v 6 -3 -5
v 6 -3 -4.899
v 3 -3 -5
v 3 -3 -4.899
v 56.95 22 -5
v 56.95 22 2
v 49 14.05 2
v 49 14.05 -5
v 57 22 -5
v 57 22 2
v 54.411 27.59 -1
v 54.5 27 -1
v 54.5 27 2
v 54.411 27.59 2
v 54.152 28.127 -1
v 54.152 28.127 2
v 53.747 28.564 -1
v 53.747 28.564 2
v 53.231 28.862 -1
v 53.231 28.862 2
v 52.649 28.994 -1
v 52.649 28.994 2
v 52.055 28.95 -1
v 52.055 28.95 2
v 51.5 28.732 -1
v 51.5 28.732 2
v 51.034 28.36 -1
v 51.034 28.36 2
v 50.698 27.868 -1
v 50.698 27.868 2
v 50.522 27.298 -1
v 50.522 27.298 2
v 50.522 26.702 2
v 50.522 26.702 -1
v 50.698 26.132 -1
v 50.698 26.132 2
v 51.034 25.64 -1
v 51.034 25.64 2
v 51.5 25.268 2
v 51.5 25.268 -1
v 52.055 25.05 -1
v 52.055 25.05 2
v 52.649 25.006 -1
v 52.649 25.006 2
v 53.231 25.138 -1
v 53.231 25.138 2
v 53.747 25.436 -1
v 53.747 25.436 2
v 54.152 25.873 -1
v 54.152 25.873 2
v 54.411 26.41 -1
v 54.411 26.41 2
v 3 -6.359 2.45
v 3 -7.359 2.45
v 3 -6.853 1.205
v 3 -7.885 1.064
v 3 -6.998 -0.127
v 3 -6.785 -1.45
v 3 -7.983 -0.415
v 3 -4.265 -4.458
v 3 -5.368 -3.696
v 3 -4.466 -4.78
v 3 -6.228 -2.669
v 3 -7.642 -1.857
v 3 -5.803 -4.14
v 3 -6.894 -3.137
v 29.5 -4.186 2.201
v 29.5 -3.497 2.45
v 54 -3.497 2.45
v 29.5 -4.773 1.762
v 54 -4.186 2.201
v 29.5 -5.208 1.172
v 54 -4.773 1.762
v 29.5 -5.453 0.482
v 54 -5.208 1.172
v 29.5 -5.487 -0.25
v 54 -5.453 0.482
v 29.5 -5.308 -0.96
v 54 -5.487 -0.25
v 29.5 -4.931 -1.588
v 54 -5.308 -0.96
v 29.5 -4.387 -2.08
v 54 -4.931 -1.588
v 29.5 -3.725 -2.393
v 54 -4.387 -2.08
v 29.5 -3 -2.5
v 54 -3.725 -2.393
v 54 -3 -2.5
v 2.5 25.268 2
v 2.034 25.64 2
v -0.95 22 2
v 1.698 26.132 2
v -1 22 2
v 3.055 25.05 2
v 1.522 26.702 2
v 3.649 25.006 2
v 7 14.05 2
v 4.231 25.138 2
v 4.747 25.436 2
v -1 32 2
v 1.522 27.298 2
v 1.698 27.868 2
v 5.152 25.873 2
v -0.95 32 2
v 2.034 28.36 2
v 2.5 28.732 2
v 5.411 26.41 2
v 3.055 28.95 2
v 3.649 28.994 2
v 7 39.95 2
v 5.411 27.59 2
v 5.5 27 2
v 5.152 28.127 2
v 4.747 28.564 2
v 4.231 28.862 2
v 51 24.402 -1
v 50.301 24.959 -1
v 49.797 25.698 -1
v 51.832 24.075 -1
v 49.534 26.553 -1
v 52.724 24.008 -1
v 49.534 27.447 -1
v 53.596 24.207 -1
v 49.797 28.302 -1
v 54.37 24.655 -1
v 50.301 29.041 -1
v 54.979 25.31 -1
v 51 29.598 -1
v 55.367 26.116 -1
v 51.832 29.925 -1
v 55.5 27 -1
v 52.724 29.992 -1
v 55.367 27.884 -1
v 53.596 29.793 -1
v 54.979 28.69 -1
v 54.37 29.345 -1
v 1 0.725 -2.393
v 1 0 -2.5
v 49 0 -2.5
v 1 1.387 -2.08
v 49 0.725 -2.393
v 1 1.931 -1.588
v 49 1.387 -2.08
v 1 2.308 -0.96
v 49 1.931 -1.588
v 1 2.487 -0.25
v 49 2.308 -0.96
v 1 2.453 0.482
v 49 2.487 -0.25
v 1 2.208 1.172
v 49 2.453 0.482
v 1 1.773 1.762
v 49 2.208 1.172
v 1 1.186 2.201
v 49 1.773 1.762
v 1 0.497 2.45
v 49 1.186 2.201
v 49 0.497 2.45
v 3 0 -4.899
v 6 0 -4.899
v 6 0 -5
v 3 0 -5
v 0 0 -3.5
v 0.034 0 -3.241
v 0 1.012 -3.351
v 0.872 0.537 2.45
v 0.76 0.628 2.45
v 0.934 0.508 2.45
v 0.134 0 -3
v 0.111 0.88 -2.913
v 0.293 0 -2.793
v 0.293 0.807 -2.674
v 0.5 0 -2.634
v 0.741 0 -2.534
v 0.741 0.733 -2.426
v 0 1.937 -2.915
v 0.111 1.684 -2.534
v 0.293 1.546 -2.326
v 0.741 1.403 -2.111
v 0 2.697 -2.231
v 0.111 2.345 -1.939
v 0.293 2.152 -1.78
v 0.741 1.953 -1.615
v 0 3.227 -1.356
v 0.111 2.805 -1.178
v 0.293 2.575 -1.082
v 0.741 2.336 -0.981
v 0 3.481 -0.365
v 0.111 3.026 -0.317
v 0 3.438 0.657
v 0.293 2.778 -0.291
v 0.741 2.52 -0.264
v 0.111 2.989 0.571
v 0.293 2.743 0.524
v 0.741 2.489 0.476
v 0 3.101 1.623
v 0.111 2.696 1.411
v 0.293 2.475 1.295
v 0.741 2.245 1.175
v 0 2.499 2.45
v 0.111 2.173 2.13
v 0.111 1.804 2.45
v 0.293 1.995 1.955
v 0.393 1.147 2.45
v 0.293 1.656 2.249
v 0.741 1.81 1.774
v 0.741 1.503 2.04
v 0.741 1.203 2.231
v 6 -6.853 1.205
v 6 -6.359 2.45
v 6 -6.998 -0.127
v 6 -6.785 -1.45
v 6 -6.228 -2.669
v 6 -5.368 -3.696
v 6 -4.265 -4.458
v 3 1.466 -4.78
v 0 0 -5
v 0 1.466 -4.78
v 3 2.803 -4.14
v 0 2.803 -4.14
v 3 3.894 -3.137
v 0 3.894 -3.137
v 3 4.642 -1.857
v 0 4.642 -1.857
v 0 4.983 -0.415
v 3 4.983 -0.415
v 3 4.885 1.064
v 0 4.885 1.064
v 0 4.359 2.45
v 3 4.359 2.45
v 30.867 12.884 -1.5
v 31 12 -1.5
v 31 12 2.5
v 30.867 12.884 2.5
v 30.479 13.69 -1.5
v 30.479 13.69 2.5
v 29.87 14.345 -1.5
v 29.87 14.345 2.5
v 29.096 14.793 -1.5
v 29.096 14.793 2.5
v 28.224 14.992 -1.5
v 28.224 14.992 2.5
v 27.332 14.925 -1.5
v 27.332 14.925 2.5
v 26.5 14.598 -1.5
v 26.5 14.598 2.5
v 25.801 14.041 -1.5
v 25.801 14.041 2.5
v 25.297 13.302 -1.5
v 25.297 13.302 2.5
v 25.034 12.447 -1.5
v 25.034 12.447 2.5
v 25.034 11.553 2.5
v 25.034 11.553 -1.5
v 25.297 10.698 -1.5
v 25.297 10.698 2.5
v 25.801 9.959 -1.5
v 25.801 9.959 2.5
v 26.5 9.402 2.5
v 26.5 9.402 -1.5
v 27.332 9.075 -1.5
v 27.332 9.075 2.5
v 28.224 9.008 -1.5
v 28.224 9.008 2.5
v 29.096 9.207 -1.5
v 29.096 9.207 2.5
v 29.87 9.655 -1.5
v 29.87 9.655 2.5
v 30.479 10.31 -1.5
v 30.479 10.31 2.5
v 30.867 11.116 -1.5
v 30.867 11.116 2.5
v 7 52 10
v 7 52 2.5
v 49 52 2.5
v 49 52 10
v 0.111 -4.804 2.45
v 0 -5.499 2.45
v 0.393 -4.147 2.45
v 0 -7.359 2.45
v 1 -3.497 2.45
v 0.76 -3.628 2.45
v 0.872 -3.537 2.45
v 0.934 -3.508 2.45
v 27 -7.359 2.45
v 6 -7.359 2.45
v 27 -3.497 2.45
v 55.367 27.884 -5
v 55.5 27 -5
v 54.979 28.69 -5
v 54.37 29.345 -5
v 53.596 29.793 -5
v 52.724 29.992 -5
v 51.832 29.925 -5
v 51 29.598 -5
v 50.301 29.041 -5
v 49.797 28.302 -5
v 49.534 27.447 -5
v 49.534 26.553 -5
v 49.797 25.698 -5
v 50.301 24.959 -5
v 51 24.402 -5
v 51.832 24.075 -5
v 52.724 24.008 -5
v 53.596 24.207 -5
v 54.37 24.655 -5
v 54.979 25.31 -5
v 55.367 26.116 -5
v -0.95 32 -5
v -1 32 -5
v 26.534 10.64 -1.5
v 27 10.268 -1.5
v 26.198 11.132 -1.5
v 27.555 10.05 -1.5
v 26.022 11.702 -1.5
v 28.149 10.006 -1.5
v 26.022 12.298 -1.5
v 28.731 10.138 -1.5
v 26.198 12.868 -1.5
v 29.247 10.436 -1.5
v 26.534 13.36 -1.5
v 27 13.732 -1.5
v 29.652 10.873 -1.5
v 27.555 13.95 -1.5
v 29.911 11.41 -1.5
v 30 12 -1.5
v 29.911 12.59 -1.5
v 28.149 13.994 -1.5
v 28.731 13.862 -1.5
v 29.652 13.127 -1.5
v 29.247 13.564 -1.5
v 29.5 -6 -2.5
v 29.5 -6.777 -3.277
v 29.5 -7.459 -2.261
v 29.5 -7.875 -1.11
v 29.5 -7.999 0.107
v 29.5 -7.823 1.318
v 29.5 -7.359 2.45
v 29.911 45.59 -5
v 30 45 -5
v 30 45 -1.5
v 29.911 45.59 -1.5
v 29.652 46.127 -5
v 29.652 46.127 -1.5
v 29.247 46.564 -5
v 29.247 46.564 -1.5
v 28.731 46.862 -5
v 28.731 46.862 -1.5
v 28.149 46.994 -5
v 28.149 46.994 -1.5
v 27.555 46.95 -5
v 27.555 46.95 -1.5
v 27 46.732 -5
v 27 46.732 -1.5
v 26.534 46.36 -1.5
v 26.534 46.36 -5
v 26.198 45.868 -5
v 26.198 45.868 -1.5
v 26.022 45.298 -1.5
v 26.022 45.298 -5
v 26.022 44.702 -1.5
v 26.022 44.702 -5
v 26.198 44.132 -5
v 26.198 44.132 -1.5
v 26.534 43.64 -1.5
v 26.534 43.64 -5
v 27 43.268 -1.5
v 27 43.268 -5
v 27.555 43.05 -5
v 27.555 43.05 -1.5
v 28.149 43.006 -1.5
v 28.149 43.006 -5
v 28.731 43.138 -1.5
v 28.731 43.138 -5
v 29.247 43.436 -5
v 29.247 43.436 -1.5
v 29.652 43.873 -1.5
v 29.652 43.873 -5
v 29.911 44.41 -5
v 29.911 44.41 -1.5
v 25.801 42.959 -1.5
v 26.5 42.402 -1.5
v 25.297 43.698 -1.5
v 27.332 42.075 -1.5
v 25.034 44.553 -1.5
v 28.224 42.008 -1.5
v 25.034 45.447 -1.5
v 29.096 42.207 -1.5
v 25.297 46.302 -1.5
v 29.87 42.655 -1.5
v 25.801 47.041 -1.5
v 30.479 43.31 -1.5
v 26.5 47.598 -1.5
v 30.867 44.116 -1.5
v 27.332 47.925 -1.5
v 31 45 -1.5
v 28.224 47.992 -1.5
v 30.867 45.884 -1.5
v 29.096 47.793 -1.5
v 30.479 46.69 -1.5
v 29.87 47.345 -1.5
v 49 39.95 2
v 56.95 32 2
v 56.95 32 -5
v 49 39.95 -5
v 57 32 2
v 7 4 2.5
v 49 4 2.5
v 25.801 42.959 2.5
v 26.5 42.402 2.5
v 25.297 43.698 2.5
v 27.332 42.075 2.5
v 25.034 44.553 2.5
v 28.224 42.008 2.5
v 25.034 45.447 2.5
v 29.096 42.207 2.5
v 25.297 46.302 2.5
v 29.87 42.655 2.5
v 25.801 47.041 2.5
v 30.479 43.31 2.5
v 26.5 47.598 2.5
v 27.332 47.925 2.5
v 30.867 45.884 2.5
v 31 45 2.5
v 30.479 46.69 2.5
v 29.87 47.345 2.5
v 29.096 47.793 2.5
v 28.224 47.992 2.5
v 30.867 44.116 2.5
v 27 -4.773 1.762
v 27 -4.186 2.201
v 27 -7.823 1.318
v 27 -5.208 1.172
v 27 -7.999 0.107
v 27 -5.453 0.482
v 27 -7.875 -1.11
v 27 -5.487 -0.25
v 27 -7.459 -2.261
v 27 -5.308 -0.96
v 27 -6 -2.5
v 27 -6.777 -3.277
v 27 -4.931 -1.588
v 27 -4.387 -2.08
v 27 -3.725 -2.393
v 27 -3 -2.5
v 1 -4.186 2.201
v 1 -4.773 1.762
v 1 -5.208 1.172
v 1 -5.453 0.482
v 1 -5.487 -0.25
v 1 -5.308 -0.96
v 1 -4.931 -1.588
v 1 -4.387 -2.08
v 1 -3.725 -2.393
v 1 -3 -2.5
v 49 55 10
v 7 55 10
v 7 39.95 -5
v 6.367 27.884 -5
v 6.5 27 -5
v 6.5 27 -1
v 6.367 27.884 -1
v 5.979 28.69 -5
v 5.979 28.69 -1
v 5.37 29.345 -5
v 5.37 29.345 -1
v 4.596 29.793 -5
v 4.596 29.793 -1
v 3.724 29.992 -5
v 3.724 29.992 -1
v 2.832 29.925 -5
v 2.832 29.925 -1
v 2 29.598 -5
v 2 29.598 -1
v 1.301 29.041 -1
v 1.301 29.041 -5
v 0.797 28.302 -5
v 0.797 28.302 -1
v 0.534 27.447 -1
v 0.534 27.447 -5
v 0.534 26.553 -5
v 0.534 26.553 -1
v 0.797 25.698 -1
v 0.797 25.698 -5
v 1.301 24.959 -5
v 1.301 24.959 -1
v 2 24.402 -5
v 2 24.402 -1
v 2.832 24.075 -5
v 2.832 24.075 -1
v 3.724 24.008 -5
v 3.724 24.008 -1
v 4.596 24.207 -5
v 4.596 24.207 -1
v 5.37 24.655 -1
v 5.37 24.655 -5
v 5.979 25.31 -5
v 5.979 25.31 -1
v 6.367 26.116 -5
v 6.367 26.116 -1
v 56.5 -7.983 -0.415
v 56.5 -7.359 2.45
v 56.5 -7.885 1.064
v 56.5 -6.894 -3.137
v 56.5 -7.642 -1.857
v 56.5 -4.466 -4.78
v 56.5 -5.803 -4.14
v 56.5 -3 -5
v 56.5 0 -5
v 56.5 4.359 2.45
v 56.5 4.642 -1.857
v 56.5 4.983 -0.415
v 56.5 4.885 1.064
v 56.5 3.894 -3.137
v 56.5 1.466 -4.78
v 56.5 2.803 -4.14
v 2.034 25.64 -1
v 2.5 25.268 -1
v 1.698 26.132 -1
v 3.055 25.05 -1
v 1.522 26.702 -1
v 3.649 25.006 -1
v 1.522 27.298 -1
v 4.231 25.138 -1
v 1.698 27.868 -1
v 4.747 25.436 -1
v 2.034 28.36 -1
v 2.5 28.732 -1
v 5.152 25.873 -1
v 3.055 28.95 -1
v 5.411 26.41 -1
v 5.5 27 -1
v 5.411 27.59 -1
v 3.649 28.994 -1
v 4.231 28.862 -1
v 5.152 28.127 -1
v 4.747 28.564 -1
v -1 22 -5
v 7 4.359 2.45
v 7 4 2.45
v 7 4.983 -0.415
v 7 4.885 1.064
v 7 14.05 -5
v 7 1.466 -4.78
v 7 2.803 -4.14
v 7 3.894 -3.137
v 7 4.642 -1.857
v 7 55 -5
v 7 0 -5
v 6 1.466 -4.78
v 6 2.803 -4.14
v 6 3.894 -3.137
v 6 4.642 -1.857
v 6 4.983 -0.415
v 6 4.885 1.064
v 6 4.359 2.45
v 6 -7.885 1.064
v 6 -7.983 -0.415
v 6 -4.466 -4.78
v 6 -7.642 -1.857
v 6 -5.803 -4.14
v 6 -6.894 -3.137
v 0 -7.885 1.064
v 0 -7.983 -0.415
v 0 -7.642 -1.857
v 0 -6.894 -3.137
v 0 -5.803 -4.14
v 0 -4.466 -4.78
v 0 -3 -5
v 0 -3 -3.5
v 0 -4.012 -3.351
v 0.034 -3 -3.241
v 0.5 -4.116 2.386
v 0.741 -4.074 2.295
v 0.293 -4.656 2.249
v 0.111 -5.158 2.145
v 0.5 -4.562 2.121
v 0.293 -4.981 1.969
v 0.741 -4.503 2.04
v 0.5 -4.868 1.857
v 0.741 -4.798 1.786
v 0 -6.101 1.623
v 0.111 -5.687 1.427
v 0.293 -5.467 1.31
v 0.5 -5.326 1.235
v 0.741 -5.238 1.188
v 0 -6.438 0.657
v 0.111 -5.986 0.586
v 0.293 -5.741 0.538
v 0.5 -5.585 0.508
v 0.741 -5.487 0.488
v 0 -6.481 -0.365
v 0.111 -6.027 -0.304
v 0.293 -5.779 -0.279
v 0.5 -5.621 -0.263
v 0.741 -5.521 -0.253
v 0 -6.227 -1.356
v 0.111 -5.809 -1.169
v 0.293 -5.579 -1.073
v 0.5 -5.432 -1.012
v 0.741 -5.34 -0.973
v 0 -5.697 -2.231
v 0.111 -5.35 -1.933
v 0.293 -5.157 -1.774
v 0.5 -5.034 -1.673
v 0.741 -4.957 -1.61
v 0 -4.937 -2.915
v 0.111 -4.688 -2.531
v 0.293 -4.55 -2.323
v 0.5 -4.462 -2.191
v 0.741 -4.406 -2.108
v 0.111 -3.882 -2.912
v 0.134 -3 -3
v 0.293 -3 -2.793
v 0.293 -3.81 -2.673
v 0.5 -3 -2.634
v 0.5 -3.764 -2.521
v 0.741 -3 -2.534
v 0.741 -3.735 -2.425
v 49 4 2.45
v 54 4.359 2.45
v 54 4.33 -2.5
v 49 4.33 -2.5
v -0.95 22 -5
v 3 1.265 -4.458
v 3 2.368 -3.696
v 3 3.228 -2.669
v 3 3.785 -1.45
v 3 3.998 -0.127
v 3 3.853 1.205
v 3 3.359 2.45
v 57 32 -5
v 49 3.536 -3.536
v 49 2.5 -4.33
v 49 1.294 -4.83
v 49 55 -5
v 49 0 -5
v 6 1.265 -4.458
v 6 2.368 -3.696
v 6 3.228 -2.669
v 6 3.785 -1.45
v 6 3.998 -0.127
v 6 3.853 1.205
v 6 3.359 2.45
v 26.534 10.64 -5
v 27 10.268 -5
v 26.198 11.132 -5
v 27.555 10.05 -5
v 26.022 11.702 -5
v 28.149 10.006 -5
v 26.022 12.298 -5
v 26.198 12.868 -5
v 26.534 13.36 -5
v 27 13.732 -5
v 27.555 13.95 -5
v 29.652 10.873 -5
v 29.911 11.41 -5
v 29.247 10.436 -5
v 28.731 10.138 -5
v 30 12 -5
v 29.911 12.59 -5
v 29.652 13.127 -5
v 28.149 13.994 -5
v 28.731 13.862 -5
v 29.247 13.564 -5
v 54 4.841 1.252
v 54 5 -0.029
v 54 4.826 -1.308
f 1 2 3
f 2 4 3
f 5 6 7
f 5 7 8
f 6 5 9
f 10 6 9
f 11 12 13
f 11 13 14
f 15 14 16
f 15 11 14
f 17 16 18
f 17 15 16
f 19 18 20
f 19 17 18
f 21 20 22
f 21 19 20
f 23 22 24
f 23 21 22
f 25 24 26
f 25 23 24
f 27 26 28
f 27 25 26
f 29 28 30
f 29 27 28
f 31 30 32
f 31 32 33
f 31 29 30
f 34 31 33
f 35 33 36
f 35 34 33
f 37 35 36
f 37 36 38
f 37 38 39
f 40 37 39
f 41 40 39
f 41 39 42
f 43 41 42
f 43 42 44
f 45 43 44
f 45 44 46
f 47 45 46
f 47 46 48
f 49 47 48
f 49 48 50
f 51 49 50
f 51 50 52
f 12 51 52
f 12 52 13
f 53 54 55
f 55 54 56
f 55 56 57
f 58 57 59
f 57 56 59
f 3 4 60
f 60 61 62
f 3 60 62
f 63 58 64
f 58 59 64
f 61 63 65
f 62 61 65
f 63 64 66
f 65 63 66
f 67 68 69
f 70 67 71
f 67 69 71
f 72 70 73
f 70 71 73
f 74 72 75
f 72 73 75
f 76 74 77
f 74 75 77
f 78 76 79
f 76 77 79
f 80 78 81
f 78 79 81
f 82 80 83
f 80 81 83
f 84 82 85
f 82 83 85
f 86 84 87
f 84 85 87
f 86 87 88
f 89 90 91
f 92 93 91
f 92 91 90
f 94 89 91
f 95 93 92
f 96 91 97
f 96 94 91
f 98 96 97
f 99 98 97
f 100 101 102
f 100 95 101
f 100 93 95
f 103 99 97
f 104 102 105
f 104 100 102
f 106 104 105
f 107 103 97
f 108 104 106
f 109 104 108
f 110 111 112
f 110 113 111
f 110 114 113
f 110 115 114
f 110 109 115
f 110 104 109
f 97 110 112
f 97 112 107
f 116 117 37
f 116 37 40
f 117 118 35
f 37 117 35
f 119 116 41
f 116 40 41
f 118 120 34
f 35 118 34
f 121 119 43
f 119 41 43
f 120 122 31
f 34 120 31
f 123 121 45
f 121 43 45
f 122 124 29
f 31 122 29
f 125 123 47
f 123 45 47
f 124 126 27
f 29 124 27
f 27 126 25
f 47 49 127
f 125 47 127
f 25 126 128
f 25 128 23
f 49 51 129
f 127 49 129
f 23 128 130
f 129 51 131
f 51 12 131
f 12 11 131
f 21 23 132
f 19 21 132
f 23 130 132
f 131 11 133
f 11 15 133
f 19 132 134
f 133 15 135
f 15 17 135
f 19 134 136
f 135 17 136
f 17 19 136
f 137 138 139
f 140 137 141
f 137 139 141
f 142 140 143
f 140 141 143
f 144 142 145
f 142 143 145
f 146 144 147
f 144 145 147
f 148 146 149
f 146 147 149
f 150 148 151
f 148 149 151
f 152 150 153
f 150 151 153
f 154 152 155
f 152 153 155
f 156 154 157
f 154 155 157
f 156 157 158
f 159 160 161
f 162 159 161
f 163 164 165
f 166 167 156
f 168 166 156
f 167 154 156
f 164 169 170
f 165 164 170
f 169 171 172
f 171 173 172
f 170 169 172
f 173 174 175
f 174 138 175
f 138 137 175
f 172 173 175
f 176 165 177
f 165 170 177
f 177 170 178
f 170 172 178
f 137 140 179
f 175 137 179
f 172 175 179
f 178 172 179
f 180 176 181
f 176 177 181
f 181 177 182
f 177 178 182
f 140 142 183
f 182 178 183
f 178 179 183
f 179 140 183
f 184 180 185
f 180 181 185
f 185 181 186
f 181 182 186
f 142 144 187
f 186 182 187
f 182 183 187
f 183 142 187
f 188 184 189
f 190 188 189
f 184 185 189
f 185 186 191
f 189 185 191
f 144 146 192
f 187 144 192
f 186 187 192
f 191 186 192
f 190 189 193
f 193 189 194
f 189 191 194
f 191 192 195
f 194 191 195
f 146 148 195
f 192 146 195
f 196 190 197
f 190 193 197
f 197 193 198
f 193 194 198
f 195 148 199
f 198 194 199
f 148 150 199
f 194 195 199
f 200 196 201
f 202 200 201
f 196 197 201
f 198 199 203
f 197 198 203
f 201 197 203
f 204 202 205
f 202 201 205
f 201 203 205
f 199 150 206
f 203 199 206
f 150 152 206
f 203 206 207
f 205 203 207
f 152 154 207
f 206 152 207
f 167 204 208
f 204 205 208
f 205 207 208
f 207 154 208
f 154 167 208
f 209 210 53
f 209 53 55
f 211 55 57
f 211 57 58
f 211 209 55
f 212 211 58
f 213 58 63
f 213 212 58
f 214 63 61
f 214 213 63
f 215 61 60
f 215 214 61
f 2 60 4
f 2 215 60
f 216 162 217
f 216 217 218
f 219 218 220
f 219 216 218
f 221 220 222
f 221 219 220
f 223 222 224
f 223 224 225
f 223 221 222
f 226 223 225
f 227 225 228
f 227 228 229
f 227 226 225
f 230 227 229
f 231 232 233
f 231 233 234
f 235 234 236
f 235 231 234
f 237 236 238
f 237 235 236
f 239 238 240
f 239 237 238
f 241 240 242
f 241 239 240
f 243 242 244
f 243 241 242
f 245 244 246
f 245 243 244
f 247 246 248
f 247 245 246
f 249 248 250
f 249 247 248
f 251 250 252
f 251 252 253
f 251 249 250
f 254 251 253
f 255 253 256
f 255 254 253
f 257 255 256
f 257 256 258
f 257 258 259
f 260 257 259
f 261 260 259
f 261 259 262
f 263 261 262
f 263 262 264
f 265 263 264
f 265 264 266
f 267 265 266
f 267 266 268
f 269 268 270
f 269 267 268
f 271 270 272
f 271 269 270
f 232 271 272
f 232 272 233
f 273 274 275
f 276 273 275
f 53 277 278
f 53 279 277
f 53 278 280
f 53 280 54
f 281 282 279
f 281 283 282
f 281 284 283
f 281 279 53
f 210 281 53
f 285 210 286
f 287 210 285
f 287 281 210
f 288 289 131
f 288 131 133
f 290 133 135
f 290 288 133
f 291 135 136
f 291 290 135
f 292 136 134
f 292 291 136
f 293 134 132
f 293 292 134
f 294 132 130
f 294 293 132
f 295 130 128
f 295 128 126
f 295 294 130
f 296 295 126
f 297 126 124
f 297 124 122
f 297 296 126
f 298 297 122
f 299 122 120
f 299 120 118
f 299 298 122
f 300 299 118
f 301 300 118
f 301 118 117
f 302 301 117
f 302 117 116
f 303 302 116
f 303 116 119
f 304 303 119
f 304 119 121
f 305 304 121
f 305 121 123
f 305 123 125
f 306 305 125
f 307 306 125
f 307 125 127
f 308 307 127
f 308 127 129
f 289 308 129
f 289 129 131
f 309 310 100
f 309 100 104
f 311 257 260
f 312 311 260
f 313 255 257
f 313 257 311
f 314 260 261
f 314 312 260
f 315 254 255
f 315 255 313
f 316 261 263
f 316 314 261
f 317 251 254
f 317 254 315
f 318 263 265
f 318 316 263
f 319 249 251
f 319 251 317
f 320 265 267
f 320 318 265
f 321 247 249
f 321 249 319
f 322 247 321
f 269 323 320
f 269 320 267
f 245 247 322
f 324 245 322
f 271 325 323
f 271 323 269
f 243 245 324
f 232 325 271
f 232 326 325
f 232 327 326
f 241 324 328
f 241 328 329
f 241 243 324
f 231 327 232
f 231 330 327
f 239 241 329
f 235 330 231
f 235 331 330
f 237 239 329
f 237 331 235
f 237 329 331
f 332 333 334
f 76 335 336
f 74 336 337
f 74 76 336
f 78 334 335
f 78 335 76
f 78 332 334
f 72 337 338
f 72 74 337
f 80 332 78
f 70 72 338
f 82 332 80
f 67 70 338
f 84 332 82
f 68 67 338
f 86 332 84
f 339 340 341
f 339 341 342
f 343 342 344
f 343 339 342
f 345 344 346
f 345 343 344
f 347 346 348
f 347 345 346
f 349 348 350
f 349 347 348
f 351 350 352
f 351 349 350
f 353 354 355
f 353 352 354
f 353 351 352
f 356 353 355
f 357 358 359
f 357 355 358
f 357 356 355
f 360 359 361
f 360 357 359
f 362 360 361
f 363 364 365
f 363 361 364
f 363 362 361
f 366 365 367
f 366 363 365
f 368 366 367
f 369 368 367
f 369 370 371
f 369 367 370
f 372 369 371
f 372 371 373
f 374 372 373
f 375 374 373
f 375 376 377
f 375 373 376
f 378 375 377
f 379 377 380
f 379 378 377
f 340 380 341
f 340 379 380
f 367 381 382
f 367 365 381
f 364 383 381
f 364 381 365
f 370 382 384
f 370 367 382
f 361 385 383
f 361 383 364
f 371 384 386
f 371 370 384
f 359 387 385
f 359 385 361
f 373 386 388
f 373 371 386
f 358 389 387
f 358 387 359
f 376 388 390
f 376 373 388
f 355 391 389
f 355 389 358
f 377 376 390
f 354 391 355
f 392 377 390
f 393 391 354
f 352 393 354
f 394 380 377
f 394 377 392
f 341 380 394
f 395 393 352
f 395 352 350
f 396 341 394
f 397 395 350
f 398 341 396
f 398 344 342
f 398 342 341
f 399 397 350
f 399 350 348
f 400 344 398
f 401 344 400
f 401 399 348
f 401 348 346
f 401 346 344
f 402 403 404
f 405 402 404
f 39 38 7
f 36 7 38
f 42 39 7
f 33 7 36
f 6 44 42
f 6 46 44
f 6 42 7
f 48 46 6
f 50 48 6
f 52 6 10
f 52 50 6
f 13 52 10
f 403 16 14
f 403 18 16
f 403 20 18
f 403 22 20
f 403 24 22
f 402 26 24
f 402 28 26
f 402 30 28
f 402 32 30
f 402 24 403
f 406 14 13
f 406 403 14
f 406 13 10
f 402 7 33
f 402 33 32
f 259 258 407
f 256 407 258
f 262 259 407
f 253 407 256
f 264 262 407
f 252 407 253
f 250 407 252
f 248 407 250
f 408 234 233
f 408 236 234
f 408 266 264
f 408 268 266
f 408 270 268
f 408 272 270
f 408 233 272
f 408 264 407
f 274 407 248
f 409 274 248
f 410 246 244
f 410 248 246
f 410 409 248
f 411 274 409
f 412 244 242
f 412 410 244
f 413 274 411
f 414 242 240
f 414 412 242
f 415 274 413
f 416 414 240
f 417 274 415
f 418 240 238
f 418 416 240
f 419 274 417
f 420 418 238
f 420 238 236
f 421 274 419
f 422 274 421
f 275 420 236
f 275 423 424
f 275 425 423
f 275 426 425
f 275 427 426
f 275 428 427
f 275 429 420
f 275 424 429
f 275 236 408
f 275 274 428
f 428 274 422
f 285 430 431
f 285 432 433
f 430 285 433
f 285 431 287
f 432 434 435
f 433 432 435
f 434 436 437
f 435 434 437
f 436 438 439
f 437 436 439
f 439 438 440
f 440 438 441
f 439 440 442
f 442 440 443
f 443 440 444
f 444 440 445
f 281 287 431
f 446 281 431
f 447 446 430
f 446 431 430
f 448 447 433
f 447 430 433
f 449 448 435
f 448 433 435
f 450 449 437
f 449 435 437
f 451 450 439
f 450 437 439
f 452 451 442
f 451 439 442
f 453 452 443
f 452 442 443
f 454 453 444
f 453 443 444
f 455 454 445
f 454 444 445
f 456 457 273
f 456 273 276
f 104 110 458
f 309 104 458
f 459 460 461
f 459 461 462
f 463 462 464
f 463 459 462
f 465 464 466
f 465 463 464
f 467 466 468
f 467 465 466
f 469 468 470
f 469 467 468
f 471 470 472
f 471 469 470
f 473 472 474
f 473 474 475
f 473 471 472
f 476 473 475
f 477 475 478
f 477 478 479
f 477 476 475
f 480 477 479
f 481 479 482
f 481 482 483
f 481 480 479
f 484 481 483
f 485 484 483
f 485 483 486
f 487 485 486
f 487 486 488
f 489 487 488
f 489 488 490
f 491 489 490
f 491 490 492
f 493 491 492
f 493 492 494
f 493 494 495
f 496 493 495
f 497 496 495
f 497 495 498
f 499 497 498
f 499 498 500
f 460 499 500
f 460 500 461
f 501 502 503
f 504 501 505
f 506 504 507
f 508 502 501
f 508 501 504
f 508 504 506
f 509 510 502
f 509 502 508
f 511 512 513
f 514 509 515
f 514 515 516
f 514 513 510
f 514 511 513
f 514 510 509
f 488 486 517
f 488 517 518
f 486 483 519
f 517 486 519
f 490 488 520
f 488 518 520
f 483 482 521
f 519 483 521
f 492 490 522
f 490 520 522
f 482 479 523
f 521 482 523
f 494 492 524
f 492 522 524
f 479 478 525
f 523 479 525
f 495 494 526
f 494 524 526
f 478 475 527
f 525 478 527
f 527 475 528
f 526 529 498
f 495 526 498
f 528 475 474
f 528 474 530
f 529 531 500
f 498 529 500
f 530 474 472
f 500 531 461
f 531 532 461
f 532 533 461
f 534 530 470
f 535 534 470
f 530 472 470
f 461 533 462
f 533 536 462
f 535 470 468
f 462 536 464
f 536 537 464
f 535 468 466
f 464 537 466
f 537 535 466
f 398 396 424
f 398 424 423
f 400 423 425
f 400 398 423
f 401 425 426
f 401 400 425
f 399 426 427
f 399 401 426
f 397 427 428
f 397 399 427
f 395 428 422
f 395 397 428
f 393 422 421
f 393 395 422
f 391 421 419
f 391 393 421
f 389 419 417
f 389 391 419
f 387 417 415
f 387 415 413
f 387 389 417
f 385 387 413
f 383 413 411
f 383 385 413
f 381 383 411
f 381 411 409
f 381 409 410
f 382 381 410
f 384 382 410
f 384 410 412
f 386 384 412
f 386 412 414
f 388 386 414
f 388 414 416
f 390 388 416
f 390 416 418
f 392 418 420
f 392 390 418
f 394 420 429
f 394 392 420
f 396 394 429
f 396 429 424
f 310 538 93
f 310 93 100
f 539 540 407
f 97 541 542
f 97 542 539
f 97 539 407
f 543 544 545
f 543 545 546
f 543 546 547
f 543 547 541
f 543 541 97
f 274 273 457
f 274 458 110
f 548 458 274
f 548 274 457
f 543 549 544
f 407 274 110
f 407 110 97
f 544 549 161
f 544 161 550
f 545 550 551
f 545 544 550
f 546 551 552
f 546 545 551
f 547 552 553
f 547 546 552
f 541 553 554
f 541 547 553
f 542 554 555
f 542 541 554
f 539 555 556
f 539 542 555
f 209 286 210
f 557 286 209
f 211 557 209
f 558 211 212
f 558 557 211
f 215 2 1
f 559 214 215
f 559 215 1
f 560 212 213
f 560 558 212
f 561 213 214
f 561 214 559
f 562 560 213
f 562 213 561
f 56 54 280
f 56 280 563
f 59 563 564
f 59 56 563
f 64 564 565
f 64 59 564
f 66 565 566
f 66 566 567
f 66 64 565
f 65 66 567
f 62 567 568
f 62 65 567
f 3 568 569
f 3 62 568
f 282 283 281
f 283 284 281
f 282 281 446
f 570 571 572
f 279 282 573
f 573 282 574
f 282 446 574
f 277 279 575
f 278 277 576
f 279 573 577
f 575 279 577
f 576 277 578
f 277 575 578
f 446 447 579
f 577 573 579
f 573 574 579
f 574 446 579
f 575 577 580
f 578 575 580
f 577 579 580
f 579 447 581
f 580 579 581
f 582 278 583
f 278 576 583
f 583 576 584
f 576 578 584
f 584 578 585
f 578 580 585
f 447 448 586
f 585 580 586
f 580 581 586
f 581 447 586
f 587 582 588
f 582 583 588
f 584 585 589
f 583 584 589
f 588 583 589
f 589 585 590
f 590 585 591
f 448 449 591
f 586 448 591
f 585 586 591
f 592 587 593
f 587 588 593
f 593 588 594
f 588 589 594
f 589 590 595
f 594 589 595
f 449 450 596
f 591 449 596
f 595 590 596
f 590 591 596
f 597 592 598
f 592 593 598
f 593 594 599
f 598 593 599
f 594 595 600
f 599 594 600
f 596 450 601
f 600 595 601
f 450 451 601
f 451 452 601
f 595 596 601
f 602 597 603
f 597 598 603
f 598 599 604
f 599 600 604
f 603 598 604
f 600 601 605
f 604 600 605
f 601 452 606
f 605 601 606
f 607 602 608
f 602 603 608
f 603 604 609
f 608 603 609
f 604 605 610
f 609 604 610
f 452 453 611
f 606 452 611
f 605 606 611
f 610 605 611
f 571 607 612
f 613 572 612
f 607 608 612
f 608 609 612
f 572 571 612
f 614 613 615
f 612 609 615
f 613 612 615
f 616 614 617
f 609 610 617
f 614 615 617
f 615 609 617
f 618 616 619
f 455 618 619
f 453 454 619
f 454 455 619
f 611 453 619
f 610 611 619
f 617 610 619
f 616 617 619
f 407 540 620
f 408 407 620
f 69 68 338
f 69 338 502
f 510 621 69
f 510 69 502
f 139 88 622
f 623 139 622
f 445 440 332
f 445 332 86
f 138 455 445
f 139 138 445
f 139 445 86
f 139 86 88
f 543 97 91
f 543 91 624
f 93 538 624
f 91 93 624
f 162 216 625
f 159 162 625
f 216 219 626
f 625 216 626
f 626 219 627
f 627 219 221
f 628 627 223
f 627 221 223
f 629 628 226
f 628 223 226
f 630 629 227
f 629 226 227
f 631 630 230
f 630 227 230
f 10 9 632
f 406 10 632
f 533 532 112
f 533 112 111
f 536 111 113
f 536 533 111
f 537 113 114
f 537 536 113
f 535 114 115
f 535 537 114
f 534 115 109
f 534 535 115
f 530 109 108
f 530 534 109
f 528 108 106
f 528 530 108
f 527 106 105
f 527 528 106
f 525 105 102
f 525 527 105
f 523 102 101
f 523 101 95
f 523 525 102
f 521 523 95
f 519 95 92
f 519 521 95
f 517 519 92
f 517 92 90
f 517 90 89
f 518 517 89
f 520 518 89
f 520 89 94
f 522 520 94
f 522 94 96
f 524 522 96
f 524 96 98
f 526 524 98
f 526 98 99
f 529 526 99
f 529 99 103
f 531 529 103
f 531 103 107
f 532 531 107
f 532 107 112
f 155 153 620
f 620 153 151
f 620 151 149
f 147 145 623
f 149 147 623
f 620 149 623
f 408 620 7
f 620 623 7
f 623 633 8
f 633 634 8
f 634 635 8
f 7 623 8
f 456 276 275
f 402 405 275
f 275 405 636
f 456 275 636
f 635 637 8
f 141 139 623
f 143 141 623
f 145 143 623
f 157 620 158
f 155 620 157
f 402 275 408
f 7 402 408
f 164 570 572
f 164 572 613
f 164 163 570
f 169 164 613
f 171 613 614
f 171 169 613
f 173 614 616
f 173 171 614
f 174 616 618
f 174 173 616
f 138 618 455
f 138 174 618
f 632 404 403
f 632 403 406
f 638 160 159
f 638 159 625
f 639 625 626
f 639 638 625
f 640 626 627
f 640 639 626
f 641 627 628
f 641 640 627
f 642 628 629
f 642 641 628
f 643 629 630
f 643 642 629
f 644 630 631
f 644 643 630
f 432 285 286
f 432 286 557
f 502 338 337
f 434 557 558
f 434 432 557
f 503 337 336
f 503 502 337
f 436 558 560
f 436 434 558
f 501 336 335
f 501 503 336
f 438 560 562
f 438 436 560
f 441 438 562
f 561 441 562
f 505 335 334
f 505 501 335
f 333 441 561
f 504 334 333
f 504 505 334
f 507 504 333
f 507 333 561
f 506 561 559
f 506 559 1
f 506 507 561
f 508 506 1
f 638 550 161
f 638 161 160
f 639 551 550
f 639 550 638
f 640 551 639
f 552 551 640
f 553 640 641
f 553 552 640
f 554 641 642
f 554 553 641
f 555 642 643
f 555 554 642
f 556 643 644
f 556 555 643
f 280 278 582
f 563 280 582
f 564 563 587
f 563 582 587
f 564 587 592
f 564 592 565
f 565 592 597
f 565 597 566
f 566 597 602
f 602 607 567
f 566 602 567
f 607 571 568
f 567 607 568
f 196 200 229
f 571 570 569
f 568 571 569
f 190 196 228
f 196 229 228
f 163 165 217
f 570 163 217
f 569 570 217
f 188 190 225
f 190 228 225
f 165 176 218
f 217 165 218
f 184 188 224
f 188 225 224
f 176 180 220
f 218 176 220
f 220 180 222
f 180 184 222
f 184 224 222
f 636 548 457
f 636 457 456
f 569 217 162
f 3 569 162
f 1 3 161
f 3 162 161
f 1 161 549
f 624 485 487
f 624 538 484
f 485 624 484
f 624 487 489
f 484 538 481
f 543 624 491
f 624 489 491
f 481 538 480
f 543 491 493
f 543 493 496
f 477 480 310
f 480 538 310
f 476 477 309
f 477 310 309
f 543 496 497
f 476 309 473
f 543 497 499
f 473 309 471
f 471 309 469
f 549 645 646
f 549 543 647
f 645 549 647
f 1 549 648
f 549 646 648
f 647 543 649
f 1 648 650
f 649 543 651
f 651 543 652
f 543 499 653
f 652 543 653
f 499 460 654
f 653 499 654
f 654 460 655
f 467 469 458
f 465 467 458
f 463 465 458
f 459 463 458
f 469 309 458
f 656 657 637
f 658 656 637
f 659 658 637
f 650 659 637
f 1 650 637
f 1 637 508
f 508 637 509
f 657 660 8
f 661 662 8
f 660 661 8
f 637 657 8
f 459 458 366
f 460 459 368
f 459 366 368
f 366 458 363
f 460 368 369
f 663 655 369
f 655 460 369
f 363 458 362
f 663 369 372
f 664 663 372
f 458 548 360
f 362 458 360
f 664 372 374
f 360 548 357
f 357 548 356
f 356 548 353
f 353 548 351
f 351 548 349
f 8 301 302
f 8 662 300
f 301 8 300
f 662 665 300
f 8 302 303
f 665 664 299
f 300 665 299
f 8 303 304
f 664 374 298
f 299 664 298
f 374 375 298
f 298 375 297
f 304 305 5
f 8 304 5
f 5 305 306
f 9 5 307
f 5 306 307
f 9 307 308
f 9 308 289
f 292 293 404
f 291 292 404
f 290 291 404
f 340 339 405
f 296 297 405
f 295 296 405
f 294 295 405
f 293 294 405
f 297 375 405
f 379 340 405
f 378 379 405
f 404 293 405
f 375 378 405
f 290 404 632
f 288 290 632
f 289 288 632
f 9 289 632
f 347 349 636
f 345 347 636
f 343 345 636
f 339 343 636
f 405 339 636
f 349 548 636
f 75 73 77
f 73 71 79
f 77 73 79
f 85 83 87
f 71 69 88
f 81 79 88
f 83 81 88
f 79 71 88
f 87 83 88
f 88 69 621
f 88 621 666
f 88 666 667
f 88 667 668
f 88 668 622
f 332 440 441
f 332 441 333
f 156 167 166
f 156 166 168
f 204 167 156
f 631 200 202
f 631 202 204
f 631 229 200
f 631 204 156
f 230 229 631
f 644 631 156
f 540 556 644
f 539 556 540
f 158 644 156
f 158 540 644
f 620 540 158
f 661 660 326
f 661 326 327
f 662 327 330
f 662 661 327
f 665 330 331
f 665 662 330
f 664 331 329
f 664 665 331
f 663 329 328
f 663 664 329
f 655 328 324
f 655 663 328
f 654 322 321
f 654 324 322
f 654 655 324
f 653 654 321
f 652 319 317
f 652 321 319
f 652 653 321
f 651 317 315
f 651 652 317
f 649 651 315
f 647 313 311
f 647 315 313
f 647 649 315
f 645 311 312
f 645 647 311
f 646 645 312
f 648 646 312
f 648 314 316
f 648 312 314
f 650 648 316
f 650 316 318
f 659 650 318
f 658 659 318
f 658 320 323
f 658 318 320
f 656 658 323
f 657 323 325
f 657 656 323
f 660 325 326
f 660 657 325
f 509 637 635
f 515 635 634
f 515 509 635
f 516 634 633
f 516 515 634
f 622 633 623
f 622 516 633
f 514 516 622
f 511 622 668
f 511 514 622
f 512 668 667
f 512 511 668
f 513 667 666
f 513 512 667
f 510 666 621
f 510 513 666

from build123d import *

# Parameters (mm, degrees)
CYLINDER008_R           = 3
CYLINDER008_DEPTH       = 4
CYLINDER009_R           = 2
CYLINDER009_DEPTH       = 11.5
CYLINDER007_R           = 3
CYLINDER007_DEPTH       = 4
CYLINDER006_R           = 2
CYLINDER006_DEPTH       = 11.5
CYLINDER004_R           = 2
CYLINDER004_DEPTH       = 10
CYLINDER005_R           = 3
CYLINDER005_DEPTH       = 7
CYLINDER003_R           = 2
CYLINDER003_DEPTH       = 10
CYLINDER_R              = 3
CYLINDER_DEPTH          = 7
CYLINDER002_R           = 5
CYLINDER002_DEPTH       = 56.5
CYLINDER002_PITCH_ANGLE = 90
BOX011_W                = 42
BOX011_H                = 5
BOX011_DEPTH            = 5
BOX007_W                = 42
BOX007_H                = 48
BOX007_DEPTH            = 7.5
BOX008_W                = 42
BOX008_H                = 3
BOX008_DEPTH            = 15
BOX015_W                = 10
BOX015_H                = 10
BOX015_DEPTH            = 7
BOX014_W                = 10
BOX014_H                = 10
BOX014_DEPTH            = 7
BOX020_W                = 2.5
BOX020_H                = 7.5
BOX020_DEPTH            = 10
BOX020_ROLL_ANGLE       = 45
BOX005_W                = 2.5
BOX005_H                = 5
BOX005_DEPTH            = 10
BOX018_W                = 5
BOX018_H                = 5
BOX018_DEPTH            = 10
BOX019_W                = 58
BOX019_H                = 13
BOX019_DEPTH            = 10
CYLINDER021_W           = 5
CYLINDER021_H           = 3
CYLINDER021_ANGLE       = 180
CYLINDER019_W           = 5
CYLINDER019_H           = 3
CYLINDER019_ANGLE       = 180
CYLINDER017_W           = 2.5
CYLINDER017_H           = 54
CYLINDER017_ANGLE       = 180
CYLINDER016_W           = 5
CYLINDER016_H           = 56.5
CYLINDER016_ANGLE       = 180
BOX017_W                = 5
BOX017_H                = 3
BOX017_DEPTH            = 54
BOX016_W                = 10
BOX016_H                = 3
BOX016_DEPTH            = 56.5
CYLINDER020_W           = 5
CYLINDER020_H           = 3
CYLINDER020_ANGLE       = 180
CYLINDER018_W           = 5
CYLINDER018_H           = 3
CYLINDER018_ANGLE       = 180
CYLINDER014_W           = 2.5
CYLINDER014_H           = 54
CYLINDER014_ANGLE       = 180
CYLINDER015_W           = 5
CYLINDER015_H           = 56.5
CYLINDER015_ANGLE       = 180
FUSION007_PITCH_ANGLE   = 90
FILLET_R                = 1
CHAMFER003_SIZE         = 7.95


with BuildPart() as cylinder011:
    # Cylinder008 → Cylinder008 (new body)
    with BuildSketch(Plane.XY.offset(7.5)):
        Circle(CYLINDER008_R)
    extrude(amount=CYLINDER008_DEPTH)


with BuildPart() as bolt_hole4:
    # Cylinder009 → Cylinder009 (new body)
    with BuildSketch(Plane.XY):
        Circle(CYLINDER009_R)
    extrude(amount=CYLINDER009_DEPTH)

    # Fusion004: union Cylinder011
    add(cylinder011.part)


with BuildPart() as bolt_hole4_1:
    # Fusion004 placement: moved
    add(bolt_hole4.part.moved(Location((28, 45, -9))))


with BuildPart() as cylinder008:
    # Cylinder007 → Cylinder007 (new body)
    with BuildSketch(Plane.XY.offset(7.5)):
        Circle(CYLINDER007_R)
    extrude(amount=CYLINDER007_DEPTH)


with BuildPart() as bolt_hole3:
    # Cylinder006 → Cylinder006 (new body)
    with BuildSketch(Plane.XY):
        Circle(CYLINDER006_R)
    extrude(amount=CYLINDER006_DEPTH)

    # Fusion003: union Cylinder008
    add(cylinder008.part)


with BuildPart() as bolt_hole3_1:
    # Fusion003 placement: moved
    add(bolt_hole3.part.moved(Location((28, 12, -9))))


with BuildPart() as cylinder006:
    # Cylinder004 → Cylinder004 (new body)
    with BuildSketch(Plane.XY):
        Circle(CYLINDER004_R)
    extrude(amount=CYLINDER004_DEPTH)


with BuildPart() as bolt_hole2:
    # Cylinder005 → Cylinder005 (new body)
    with BuildSketch(Plane.XY):
        Circle(CYLINDER005_R)
    extrude(amount=CYLINDER005_DEPTH)

    # Fusion002: union Cylinder006
    add(cylinder006.part)


with BuildPart() as bolt_hole2_1:
    # Fusion002 placement: moved
    add(bolt_hole2.part.moved(Location((52.5, 27, -8))))


with BuildPart() as cylinder001:
    # Cylinder003 → Cylinder003 (new body)
    with BuildSketch(Plane.XY):
        Circle(CYLINDER003_R)
    extrude(amount=CYLINDER003_DEPTH)


with BuildPart() as bolt_hole1:
    # Cylinder → Cylinder (new body)
    with BuildSketch(Plane.XY):
        Circle(CYLINDER_R)
    extrude(amount=CYLINDER_DEPTH)

    # Fusion001: union Cylinder001
    add(cylinder001.part)


with BuildPart() as bolt_hole1_1:
    # Fusion001 placement: moved
    add(bolt_hole1.part.moved(Location((3.5, 27, -8))))


with BuildPart() as cable_tunnel_outer_shell:
    # Cylinder002 → Cylinder002 (new body)
    with BuildSketch(Plane.XY):
        Circle(CYLINDER002_R)
    extrude(amount=CYLINDER002_DEPTH)


with BuildPart() as cable_tunnel_outer_shell_1:
    # Cylinder002 pitch: moved
    add(cable_tunnel_outer_shell.part.rotate(Axis((0, 0, 0), (0, 1, 0)), CYLINDER002_PITCH_ANGLE))


with BuildPart() as cable_tunnel_outer_shell_2:
    # Cylinder002 placement: moved
    add(cable_tunnel_outer_shell_1.part)


with BuildPart() as fill_cut1:
    # Box011 → Box011 (new body)
    with BuildSketch(Plane(origin=(7, 0, -5), x_dir=(1, 0, 0), z_dir=(0, 0, 1))):
        with Locations((21, 2.5)):
            Rectangle(BOX011_W, BOX011_H)
    extrude(amount=BOX011_DEPTH)

    # Cut: cut cable-tunnel-outer-shell
    add(cable_tunnel_outer_shell_2.part, mode=Mode.SUBTRACT)


with BuildPart() as base_plate1:
    # Box007 → Box007 (new body)
    with BuildSketch(Plane(origin=(7, 4, -5), x_dir=(1, 0, 0), z_dir=(0, 0, 1))):
        with Locations((21, 24)):
            Rectangle(BOX007_W, BOX007_H)
    extrude(amount=BOX007_DEPTH)


with BuildPart() as nema17_support:
    # Box008 → Box008 (new body)
    with BuildSketch(Plane(origin=(7, 52, -5), x_dir=(1, 0, 0), z_dir=(0, 0, 1))):
        with Locations((21, 1.5)):
            Rectangle(BOX008_W, BOX008_H)
    extrude(amount=BOX008_DEPTH)


with BuildPart() as hold2:
    # Box015 → Box015 (new body)
    with BuildSketch(Plane(origin=(47, 22, -5), x_dir=(1, 0, 0), z_dir=(0, 0, 1))):
        with Locations((5, 5)):
            Rectangle(BOX015_W, BOX015_H)
    extrude(amount=BOX015_DEPTH)


with BuildPart() as hold1:
    # Box014 → Box014 (new body)
    with BuildSketch(Plane(origin=(-1, 22, -5), x_dir=(1, 0, 0), z_dir=(0, 0, 1))):
        with Locations((5, 5)):
            Rectangle(BOX014_W, BOX014_H)
    extrude(amount=BOX014_DEPTH)


with BuildPart() as cut_endstop_cable45:
    # Box020 → Box020 (new body)
    with BuildSketch(Plane.XY):
        with Locations((1.25, 3.75)):
            Rectangle(BOX020_W, BOX020_H)
    extrude(amount=BOX020_DEPTH)


with BuildPart() as cut_endstop_cable45_1:
    # Box020 roll: moved
    add(cut_endstop_cable45.part.rotate(Axis((0, 0, 0), (1, 0, 0)), BOX020_ROLL_ANGLE))


with BuildPart() as cut_endstop_cable45_2:
    # Box020 placement: moved
    add(cut_endstop_cable45_1.part.moved(Location((27, -8, -4.5))))


with BuildPart() as cut_endstop_cable:
    # Box005 → Box005 (new body)
    with BuildSketch(Plane(origin=(27, -8, -2.5), x_dir=(1, 0, 0), z_dir=(0, 0, 1))):
        with Locations((1.25, 2.5)):
            Rectangle(BOX005_W, BOX005_H)
    extrude(amount=BOX005_DEPTH)


with BuildPart() as cut_cable_drop:
    # Box018 → Box018 (new body)
    with BuildSketch(Plane(origin=(49, 0, -2.5), x_dir=(1, 0, 0), z_dir=(0, 0, 1))):
        with Locations((2.5, 2.5)):
            Rectangle(BOX018_W, BOX018_H)
    extrude(amount=BOX018_DEPTH)


with BuildPart() as cut_open:
    # Box019 → Box019 (new body)
    with BuildSketch(Plane(origin=(-1, -8, 2.45), x_dir=(1, 0, 0), z_dir=(0, 0, 1))):
        with Locations((29, 6.5)):
            Rectangle(BOX019_W, BOX019_H)
    extrude(amount=BOX019_DEPTH)


with BuildPart() as cable_tunnel_ziptie_inner_upper:
    # Cylinder021 → Cylinder021 (revolve)
    with BuildSketch(Plane(origin=(0, 1, 3), x_dir=(-1, 0, 0), z_dir=(0, 1, 0))):
        with Locations((2.5, 1.5)):
            Rectangle(CYLINDER021_W, CYLINDER021_H)
    revolve(axis=Axis((0, 1, 3), (0, 0, 1)), revolution_arc=CYLINDER021_ANGLE)


with BuildPart() as cable_tunnel_ziptie_upper_groove:
    # Cylinder019 → Cylinder019 (revolve)
    with BuildSketch(Plane(origin=(0, 0, 3), x_dir=(-1, 0, 0), z_dir=(0, 1, 0))):
        with Locations((2.5, 1.5)):
            Rectangle(CYLINDER019_W, CYLINDER019_H)
    revolve(axis=Axis((0, 0, 3), (0, 0, 1)), revolution_arc=CYLINDER019_ANGLE)

    # Cut014: cut cable-tunnel-ziptie-inner-upper
    add(cable_tunnel_ziptie_inner_upper.part, mode=Mode.SUBTRACT)


with BuildPart() as cable_tunnel_inner_upper:
    # Cylinder017 → Cylinder017 (revolve)
    with BuildSketch(Plane(origin=(0, 0, 0), x_dir=(-1, 0, 0), z_dir=(0, 1, 0))):
        with Locations((1.25, 27)):
            Rectangle(CYLINDER017_W, CYLINDER017_H)
    revolve(axis=Axis((0, 0, 0), (0, 0, 1)), revolution_arc=CYLINDER017_ANGLE)


with BuildPart() as cable_tunnel_upper:
    # Cylinder016 → Cylinder016 (revolve)
    with BuildSketch(Plane(origin=(0, 0, 0), x_dir=(-1, 0, 0), z_dir=(0, 1, 0))):
        with Locations((2.5, 28.25)):
            Rectangle(CYLINDER016_W, CYLINDER016_H)
    revolve(axis=Axis((0, 0, 0), (0, 0, 1)), revolution_arc=CYLINDER016_ANGLE)

    # Cut018: cut cable-tunnel-inner-upper
    add(cable_tunnel_inner_upper.part, mode=Mode.SUBTRACT)

    # Cut019: cut cable-tunnel-ziptie-upper-groove
    add(cable_tunnel_ziptie_upper_groove.part, mode=Mode.SUBTRACT)


with BuildPart() as cable_tunnel_upper_1:
    # Cut019 placement: moved
    add(cable_tunnel_upper.part.moved(Location((0, -3, 0))))


with BuildPart() as cable_tunnel_middle_inner:
    # Box017 → Box017 (new body)
    with BuildSketch(Plane(origin=(-2.5, -3, 0), x_dir=(1, 0, 0), z_dir=(0, 0, 1))):
        with Locations((2.5, 1.5)):
            Rectangle(BOX017_W, BOX017_H)
    extrude(amount=BOX017_DEPTH)


with BuildPart() as cable_tunnel_middle:
    # Box016 → Box016 (new body)
    with BuildSketch(Plane(origin=(-5, -3, 0), x_dir=(1, 0, 0), z_dir=(0, 0, 1))):
        with Locations((5, 1.5)):
            Rectangle(BOX016_W, BOX016_H)
    extrude(amount=BOX016_DEPTH)

    # Cut020: cut cable-tunnel-middle-inner
    add(cable_tunnel_middle_inner.part, mode=Mode.SUBTRACT)


with BuildPart() as cable_tunnel_ziptie_inner_lower:
    # Cylinder020 → Cylinder020 (revolve)
    with BuildSketch(Plane(origin=(0, -1, 3), x_dir=(1, 0, 0), z_dir=(0, -1, 0))):
        with Locations((2.5, 1.5)):
            Rectangle(CYLINDER020_W, CYLINDER020_H)
    revolve(axis=Axis((0, -1, 3), (0, 0, 1)), revolution_arc=CYLINDER020_ANGLE)


with BuildPart() as cable_tunnel_ziptie_lower_groove:
    # Cylinder018 → Cylinder018 (revolve)
    with BuildSketch(Plane(origin=(0, 0, 3), x_dir=(1, 0, 0), z_dir=(0, -1, 0))):
        with Locations((2.5, 1.5)):
            Rectangle(CYLINDER018_W, CYLINDER018_H)
    revolve(axis=Axis((0, 0, 3), (0, 0, 1)), revolution_arc=CYLINDER018_ANGLE)

    # Cut015: cut cable-tunnel-ziptie-inner-lower
    add(cable_tunnel_ziptie_inner_lower.part, mode=Mode.SUBTRACT)


with BuildPart() as cable_tunnel_inner_lower:
    # Cylinder014 → Cylinder014 (revolve)
    with BuildSketch(Plane.XZ):
        with Locations((1.25, 27)):
            Rectangle(CYLINDER014_W, CYLINDER014_H)
    revolve(axis=Axis((0, 0, 0), (0, 0, 1)), revolution_arc=CYLINDER014_ANGLE)


with BuildPart() as holder_with_cable_tunnel:
    # Cylinder015 → Cylinder015 (revolve)
    with BuildSketch(Plane.XZ):
        with Locations((2.5, 28.25)):
            Rectangle(CYLINDER015_W, CYLINDER015_H)
    revolve(axis=Axis((0, 0, 0), (0, 0, 1)), revolution_arc=CYLINDER015_ANGLE)

    # Cut016: cut cable-tunnel-inner-lower
    add(cable_tunnel_inner_lower.part, mode=Mode.SUBTRACT)

    # Cut017: cut cable-tunnel-ziptie-lower-groove
    add(cable_tunnel_ziptie_lower_groove.part, mode=Mode.SUBTRACT)

    # Fusion007: union cable-tunnel-upper, cable-tunnel-middle
    add(cable_tunnel_upper_1.part)
    add(cable_tunnel_middle.part)


with BuildPart() as holder_with_cable_tunnel_1:
    # Fusion007 pitch: moved
    add(holder_with_cable_tunnel.part.rotate(Axis((0, 0, 0), (0, 1, 0)), FUSION007_PITCH_ANGLE))


with BuildPart() as holder_with_cable_tunnel_2:
    # Fusion007 placement: moved
    add(holder_with_cable_tunnel_1.part)

    # Cut021: cut cut-open
    add(cut_open.part, mode=Mode.SUBTRACT)

    # Cut022: cut cut-cable-drop
    add(cut_cable_drop.part, mode=Mode.SUBTRACT)

    # Cut023: cut cut-endstop-cable
    add(cut_endstop_cable.part, mode=Mode.SUBTRACT)

    # Cut024: cut cut-endstop-cable45
    add(cut_endstop_cable45_2.part, mode=Mode.SUBTRACT)

    # Fillet
    fillet_edges = [holder_with_cable_tunnel_2.edges().sort_by_distance(p)[0] for p in [
        (0, -5.487469, -0.25),
        (0, -1.5, -2.5),
        (0, 2.487469, -0.25),
    ]]
    fillet(fillet_edges, radius=FILLET_R)

    # Fusion008: union fill-cut1, base-plate1, nema17-support, hold2, hold1
    add(fill_cut1.part)
    add(base_plate1.part)
    add(nema17_support.part)
    add(hold2.part)
    add(hold1.part)

    # Cut025: cut bolt-hole1
    add(bolt_hole1_1.part, mode=Mode.SUBTRACT)

    # Cut026: cut bolt-hole2
    add(bolt_hole2_1.part, mode=Mode.SUBTRACT)

    # Cut027: cut bolt-hole3
    add(bolt_hole3_1.part, mode=Mode.SUBTRACT)

    # Cut028: cut bolt-hole4
    add(bolt_hole4_1.part, mode=Mode.SUBTRACT)

    # Chamfer003
    chamfer003_edges = [holder_with_cable_tunnel_2.edges().sort_by_distance(p)[0] for p in [
        (7, 22, -1.5),
        (7, 32, -1.5),
        (49, 32, -1.5),
        (49, 22, -1.5),
    ]]
    chamfer(chamfer003_edges, length=CHAMFER003_SIZE)


solid = holder_with_cable_tunnel_2.part
